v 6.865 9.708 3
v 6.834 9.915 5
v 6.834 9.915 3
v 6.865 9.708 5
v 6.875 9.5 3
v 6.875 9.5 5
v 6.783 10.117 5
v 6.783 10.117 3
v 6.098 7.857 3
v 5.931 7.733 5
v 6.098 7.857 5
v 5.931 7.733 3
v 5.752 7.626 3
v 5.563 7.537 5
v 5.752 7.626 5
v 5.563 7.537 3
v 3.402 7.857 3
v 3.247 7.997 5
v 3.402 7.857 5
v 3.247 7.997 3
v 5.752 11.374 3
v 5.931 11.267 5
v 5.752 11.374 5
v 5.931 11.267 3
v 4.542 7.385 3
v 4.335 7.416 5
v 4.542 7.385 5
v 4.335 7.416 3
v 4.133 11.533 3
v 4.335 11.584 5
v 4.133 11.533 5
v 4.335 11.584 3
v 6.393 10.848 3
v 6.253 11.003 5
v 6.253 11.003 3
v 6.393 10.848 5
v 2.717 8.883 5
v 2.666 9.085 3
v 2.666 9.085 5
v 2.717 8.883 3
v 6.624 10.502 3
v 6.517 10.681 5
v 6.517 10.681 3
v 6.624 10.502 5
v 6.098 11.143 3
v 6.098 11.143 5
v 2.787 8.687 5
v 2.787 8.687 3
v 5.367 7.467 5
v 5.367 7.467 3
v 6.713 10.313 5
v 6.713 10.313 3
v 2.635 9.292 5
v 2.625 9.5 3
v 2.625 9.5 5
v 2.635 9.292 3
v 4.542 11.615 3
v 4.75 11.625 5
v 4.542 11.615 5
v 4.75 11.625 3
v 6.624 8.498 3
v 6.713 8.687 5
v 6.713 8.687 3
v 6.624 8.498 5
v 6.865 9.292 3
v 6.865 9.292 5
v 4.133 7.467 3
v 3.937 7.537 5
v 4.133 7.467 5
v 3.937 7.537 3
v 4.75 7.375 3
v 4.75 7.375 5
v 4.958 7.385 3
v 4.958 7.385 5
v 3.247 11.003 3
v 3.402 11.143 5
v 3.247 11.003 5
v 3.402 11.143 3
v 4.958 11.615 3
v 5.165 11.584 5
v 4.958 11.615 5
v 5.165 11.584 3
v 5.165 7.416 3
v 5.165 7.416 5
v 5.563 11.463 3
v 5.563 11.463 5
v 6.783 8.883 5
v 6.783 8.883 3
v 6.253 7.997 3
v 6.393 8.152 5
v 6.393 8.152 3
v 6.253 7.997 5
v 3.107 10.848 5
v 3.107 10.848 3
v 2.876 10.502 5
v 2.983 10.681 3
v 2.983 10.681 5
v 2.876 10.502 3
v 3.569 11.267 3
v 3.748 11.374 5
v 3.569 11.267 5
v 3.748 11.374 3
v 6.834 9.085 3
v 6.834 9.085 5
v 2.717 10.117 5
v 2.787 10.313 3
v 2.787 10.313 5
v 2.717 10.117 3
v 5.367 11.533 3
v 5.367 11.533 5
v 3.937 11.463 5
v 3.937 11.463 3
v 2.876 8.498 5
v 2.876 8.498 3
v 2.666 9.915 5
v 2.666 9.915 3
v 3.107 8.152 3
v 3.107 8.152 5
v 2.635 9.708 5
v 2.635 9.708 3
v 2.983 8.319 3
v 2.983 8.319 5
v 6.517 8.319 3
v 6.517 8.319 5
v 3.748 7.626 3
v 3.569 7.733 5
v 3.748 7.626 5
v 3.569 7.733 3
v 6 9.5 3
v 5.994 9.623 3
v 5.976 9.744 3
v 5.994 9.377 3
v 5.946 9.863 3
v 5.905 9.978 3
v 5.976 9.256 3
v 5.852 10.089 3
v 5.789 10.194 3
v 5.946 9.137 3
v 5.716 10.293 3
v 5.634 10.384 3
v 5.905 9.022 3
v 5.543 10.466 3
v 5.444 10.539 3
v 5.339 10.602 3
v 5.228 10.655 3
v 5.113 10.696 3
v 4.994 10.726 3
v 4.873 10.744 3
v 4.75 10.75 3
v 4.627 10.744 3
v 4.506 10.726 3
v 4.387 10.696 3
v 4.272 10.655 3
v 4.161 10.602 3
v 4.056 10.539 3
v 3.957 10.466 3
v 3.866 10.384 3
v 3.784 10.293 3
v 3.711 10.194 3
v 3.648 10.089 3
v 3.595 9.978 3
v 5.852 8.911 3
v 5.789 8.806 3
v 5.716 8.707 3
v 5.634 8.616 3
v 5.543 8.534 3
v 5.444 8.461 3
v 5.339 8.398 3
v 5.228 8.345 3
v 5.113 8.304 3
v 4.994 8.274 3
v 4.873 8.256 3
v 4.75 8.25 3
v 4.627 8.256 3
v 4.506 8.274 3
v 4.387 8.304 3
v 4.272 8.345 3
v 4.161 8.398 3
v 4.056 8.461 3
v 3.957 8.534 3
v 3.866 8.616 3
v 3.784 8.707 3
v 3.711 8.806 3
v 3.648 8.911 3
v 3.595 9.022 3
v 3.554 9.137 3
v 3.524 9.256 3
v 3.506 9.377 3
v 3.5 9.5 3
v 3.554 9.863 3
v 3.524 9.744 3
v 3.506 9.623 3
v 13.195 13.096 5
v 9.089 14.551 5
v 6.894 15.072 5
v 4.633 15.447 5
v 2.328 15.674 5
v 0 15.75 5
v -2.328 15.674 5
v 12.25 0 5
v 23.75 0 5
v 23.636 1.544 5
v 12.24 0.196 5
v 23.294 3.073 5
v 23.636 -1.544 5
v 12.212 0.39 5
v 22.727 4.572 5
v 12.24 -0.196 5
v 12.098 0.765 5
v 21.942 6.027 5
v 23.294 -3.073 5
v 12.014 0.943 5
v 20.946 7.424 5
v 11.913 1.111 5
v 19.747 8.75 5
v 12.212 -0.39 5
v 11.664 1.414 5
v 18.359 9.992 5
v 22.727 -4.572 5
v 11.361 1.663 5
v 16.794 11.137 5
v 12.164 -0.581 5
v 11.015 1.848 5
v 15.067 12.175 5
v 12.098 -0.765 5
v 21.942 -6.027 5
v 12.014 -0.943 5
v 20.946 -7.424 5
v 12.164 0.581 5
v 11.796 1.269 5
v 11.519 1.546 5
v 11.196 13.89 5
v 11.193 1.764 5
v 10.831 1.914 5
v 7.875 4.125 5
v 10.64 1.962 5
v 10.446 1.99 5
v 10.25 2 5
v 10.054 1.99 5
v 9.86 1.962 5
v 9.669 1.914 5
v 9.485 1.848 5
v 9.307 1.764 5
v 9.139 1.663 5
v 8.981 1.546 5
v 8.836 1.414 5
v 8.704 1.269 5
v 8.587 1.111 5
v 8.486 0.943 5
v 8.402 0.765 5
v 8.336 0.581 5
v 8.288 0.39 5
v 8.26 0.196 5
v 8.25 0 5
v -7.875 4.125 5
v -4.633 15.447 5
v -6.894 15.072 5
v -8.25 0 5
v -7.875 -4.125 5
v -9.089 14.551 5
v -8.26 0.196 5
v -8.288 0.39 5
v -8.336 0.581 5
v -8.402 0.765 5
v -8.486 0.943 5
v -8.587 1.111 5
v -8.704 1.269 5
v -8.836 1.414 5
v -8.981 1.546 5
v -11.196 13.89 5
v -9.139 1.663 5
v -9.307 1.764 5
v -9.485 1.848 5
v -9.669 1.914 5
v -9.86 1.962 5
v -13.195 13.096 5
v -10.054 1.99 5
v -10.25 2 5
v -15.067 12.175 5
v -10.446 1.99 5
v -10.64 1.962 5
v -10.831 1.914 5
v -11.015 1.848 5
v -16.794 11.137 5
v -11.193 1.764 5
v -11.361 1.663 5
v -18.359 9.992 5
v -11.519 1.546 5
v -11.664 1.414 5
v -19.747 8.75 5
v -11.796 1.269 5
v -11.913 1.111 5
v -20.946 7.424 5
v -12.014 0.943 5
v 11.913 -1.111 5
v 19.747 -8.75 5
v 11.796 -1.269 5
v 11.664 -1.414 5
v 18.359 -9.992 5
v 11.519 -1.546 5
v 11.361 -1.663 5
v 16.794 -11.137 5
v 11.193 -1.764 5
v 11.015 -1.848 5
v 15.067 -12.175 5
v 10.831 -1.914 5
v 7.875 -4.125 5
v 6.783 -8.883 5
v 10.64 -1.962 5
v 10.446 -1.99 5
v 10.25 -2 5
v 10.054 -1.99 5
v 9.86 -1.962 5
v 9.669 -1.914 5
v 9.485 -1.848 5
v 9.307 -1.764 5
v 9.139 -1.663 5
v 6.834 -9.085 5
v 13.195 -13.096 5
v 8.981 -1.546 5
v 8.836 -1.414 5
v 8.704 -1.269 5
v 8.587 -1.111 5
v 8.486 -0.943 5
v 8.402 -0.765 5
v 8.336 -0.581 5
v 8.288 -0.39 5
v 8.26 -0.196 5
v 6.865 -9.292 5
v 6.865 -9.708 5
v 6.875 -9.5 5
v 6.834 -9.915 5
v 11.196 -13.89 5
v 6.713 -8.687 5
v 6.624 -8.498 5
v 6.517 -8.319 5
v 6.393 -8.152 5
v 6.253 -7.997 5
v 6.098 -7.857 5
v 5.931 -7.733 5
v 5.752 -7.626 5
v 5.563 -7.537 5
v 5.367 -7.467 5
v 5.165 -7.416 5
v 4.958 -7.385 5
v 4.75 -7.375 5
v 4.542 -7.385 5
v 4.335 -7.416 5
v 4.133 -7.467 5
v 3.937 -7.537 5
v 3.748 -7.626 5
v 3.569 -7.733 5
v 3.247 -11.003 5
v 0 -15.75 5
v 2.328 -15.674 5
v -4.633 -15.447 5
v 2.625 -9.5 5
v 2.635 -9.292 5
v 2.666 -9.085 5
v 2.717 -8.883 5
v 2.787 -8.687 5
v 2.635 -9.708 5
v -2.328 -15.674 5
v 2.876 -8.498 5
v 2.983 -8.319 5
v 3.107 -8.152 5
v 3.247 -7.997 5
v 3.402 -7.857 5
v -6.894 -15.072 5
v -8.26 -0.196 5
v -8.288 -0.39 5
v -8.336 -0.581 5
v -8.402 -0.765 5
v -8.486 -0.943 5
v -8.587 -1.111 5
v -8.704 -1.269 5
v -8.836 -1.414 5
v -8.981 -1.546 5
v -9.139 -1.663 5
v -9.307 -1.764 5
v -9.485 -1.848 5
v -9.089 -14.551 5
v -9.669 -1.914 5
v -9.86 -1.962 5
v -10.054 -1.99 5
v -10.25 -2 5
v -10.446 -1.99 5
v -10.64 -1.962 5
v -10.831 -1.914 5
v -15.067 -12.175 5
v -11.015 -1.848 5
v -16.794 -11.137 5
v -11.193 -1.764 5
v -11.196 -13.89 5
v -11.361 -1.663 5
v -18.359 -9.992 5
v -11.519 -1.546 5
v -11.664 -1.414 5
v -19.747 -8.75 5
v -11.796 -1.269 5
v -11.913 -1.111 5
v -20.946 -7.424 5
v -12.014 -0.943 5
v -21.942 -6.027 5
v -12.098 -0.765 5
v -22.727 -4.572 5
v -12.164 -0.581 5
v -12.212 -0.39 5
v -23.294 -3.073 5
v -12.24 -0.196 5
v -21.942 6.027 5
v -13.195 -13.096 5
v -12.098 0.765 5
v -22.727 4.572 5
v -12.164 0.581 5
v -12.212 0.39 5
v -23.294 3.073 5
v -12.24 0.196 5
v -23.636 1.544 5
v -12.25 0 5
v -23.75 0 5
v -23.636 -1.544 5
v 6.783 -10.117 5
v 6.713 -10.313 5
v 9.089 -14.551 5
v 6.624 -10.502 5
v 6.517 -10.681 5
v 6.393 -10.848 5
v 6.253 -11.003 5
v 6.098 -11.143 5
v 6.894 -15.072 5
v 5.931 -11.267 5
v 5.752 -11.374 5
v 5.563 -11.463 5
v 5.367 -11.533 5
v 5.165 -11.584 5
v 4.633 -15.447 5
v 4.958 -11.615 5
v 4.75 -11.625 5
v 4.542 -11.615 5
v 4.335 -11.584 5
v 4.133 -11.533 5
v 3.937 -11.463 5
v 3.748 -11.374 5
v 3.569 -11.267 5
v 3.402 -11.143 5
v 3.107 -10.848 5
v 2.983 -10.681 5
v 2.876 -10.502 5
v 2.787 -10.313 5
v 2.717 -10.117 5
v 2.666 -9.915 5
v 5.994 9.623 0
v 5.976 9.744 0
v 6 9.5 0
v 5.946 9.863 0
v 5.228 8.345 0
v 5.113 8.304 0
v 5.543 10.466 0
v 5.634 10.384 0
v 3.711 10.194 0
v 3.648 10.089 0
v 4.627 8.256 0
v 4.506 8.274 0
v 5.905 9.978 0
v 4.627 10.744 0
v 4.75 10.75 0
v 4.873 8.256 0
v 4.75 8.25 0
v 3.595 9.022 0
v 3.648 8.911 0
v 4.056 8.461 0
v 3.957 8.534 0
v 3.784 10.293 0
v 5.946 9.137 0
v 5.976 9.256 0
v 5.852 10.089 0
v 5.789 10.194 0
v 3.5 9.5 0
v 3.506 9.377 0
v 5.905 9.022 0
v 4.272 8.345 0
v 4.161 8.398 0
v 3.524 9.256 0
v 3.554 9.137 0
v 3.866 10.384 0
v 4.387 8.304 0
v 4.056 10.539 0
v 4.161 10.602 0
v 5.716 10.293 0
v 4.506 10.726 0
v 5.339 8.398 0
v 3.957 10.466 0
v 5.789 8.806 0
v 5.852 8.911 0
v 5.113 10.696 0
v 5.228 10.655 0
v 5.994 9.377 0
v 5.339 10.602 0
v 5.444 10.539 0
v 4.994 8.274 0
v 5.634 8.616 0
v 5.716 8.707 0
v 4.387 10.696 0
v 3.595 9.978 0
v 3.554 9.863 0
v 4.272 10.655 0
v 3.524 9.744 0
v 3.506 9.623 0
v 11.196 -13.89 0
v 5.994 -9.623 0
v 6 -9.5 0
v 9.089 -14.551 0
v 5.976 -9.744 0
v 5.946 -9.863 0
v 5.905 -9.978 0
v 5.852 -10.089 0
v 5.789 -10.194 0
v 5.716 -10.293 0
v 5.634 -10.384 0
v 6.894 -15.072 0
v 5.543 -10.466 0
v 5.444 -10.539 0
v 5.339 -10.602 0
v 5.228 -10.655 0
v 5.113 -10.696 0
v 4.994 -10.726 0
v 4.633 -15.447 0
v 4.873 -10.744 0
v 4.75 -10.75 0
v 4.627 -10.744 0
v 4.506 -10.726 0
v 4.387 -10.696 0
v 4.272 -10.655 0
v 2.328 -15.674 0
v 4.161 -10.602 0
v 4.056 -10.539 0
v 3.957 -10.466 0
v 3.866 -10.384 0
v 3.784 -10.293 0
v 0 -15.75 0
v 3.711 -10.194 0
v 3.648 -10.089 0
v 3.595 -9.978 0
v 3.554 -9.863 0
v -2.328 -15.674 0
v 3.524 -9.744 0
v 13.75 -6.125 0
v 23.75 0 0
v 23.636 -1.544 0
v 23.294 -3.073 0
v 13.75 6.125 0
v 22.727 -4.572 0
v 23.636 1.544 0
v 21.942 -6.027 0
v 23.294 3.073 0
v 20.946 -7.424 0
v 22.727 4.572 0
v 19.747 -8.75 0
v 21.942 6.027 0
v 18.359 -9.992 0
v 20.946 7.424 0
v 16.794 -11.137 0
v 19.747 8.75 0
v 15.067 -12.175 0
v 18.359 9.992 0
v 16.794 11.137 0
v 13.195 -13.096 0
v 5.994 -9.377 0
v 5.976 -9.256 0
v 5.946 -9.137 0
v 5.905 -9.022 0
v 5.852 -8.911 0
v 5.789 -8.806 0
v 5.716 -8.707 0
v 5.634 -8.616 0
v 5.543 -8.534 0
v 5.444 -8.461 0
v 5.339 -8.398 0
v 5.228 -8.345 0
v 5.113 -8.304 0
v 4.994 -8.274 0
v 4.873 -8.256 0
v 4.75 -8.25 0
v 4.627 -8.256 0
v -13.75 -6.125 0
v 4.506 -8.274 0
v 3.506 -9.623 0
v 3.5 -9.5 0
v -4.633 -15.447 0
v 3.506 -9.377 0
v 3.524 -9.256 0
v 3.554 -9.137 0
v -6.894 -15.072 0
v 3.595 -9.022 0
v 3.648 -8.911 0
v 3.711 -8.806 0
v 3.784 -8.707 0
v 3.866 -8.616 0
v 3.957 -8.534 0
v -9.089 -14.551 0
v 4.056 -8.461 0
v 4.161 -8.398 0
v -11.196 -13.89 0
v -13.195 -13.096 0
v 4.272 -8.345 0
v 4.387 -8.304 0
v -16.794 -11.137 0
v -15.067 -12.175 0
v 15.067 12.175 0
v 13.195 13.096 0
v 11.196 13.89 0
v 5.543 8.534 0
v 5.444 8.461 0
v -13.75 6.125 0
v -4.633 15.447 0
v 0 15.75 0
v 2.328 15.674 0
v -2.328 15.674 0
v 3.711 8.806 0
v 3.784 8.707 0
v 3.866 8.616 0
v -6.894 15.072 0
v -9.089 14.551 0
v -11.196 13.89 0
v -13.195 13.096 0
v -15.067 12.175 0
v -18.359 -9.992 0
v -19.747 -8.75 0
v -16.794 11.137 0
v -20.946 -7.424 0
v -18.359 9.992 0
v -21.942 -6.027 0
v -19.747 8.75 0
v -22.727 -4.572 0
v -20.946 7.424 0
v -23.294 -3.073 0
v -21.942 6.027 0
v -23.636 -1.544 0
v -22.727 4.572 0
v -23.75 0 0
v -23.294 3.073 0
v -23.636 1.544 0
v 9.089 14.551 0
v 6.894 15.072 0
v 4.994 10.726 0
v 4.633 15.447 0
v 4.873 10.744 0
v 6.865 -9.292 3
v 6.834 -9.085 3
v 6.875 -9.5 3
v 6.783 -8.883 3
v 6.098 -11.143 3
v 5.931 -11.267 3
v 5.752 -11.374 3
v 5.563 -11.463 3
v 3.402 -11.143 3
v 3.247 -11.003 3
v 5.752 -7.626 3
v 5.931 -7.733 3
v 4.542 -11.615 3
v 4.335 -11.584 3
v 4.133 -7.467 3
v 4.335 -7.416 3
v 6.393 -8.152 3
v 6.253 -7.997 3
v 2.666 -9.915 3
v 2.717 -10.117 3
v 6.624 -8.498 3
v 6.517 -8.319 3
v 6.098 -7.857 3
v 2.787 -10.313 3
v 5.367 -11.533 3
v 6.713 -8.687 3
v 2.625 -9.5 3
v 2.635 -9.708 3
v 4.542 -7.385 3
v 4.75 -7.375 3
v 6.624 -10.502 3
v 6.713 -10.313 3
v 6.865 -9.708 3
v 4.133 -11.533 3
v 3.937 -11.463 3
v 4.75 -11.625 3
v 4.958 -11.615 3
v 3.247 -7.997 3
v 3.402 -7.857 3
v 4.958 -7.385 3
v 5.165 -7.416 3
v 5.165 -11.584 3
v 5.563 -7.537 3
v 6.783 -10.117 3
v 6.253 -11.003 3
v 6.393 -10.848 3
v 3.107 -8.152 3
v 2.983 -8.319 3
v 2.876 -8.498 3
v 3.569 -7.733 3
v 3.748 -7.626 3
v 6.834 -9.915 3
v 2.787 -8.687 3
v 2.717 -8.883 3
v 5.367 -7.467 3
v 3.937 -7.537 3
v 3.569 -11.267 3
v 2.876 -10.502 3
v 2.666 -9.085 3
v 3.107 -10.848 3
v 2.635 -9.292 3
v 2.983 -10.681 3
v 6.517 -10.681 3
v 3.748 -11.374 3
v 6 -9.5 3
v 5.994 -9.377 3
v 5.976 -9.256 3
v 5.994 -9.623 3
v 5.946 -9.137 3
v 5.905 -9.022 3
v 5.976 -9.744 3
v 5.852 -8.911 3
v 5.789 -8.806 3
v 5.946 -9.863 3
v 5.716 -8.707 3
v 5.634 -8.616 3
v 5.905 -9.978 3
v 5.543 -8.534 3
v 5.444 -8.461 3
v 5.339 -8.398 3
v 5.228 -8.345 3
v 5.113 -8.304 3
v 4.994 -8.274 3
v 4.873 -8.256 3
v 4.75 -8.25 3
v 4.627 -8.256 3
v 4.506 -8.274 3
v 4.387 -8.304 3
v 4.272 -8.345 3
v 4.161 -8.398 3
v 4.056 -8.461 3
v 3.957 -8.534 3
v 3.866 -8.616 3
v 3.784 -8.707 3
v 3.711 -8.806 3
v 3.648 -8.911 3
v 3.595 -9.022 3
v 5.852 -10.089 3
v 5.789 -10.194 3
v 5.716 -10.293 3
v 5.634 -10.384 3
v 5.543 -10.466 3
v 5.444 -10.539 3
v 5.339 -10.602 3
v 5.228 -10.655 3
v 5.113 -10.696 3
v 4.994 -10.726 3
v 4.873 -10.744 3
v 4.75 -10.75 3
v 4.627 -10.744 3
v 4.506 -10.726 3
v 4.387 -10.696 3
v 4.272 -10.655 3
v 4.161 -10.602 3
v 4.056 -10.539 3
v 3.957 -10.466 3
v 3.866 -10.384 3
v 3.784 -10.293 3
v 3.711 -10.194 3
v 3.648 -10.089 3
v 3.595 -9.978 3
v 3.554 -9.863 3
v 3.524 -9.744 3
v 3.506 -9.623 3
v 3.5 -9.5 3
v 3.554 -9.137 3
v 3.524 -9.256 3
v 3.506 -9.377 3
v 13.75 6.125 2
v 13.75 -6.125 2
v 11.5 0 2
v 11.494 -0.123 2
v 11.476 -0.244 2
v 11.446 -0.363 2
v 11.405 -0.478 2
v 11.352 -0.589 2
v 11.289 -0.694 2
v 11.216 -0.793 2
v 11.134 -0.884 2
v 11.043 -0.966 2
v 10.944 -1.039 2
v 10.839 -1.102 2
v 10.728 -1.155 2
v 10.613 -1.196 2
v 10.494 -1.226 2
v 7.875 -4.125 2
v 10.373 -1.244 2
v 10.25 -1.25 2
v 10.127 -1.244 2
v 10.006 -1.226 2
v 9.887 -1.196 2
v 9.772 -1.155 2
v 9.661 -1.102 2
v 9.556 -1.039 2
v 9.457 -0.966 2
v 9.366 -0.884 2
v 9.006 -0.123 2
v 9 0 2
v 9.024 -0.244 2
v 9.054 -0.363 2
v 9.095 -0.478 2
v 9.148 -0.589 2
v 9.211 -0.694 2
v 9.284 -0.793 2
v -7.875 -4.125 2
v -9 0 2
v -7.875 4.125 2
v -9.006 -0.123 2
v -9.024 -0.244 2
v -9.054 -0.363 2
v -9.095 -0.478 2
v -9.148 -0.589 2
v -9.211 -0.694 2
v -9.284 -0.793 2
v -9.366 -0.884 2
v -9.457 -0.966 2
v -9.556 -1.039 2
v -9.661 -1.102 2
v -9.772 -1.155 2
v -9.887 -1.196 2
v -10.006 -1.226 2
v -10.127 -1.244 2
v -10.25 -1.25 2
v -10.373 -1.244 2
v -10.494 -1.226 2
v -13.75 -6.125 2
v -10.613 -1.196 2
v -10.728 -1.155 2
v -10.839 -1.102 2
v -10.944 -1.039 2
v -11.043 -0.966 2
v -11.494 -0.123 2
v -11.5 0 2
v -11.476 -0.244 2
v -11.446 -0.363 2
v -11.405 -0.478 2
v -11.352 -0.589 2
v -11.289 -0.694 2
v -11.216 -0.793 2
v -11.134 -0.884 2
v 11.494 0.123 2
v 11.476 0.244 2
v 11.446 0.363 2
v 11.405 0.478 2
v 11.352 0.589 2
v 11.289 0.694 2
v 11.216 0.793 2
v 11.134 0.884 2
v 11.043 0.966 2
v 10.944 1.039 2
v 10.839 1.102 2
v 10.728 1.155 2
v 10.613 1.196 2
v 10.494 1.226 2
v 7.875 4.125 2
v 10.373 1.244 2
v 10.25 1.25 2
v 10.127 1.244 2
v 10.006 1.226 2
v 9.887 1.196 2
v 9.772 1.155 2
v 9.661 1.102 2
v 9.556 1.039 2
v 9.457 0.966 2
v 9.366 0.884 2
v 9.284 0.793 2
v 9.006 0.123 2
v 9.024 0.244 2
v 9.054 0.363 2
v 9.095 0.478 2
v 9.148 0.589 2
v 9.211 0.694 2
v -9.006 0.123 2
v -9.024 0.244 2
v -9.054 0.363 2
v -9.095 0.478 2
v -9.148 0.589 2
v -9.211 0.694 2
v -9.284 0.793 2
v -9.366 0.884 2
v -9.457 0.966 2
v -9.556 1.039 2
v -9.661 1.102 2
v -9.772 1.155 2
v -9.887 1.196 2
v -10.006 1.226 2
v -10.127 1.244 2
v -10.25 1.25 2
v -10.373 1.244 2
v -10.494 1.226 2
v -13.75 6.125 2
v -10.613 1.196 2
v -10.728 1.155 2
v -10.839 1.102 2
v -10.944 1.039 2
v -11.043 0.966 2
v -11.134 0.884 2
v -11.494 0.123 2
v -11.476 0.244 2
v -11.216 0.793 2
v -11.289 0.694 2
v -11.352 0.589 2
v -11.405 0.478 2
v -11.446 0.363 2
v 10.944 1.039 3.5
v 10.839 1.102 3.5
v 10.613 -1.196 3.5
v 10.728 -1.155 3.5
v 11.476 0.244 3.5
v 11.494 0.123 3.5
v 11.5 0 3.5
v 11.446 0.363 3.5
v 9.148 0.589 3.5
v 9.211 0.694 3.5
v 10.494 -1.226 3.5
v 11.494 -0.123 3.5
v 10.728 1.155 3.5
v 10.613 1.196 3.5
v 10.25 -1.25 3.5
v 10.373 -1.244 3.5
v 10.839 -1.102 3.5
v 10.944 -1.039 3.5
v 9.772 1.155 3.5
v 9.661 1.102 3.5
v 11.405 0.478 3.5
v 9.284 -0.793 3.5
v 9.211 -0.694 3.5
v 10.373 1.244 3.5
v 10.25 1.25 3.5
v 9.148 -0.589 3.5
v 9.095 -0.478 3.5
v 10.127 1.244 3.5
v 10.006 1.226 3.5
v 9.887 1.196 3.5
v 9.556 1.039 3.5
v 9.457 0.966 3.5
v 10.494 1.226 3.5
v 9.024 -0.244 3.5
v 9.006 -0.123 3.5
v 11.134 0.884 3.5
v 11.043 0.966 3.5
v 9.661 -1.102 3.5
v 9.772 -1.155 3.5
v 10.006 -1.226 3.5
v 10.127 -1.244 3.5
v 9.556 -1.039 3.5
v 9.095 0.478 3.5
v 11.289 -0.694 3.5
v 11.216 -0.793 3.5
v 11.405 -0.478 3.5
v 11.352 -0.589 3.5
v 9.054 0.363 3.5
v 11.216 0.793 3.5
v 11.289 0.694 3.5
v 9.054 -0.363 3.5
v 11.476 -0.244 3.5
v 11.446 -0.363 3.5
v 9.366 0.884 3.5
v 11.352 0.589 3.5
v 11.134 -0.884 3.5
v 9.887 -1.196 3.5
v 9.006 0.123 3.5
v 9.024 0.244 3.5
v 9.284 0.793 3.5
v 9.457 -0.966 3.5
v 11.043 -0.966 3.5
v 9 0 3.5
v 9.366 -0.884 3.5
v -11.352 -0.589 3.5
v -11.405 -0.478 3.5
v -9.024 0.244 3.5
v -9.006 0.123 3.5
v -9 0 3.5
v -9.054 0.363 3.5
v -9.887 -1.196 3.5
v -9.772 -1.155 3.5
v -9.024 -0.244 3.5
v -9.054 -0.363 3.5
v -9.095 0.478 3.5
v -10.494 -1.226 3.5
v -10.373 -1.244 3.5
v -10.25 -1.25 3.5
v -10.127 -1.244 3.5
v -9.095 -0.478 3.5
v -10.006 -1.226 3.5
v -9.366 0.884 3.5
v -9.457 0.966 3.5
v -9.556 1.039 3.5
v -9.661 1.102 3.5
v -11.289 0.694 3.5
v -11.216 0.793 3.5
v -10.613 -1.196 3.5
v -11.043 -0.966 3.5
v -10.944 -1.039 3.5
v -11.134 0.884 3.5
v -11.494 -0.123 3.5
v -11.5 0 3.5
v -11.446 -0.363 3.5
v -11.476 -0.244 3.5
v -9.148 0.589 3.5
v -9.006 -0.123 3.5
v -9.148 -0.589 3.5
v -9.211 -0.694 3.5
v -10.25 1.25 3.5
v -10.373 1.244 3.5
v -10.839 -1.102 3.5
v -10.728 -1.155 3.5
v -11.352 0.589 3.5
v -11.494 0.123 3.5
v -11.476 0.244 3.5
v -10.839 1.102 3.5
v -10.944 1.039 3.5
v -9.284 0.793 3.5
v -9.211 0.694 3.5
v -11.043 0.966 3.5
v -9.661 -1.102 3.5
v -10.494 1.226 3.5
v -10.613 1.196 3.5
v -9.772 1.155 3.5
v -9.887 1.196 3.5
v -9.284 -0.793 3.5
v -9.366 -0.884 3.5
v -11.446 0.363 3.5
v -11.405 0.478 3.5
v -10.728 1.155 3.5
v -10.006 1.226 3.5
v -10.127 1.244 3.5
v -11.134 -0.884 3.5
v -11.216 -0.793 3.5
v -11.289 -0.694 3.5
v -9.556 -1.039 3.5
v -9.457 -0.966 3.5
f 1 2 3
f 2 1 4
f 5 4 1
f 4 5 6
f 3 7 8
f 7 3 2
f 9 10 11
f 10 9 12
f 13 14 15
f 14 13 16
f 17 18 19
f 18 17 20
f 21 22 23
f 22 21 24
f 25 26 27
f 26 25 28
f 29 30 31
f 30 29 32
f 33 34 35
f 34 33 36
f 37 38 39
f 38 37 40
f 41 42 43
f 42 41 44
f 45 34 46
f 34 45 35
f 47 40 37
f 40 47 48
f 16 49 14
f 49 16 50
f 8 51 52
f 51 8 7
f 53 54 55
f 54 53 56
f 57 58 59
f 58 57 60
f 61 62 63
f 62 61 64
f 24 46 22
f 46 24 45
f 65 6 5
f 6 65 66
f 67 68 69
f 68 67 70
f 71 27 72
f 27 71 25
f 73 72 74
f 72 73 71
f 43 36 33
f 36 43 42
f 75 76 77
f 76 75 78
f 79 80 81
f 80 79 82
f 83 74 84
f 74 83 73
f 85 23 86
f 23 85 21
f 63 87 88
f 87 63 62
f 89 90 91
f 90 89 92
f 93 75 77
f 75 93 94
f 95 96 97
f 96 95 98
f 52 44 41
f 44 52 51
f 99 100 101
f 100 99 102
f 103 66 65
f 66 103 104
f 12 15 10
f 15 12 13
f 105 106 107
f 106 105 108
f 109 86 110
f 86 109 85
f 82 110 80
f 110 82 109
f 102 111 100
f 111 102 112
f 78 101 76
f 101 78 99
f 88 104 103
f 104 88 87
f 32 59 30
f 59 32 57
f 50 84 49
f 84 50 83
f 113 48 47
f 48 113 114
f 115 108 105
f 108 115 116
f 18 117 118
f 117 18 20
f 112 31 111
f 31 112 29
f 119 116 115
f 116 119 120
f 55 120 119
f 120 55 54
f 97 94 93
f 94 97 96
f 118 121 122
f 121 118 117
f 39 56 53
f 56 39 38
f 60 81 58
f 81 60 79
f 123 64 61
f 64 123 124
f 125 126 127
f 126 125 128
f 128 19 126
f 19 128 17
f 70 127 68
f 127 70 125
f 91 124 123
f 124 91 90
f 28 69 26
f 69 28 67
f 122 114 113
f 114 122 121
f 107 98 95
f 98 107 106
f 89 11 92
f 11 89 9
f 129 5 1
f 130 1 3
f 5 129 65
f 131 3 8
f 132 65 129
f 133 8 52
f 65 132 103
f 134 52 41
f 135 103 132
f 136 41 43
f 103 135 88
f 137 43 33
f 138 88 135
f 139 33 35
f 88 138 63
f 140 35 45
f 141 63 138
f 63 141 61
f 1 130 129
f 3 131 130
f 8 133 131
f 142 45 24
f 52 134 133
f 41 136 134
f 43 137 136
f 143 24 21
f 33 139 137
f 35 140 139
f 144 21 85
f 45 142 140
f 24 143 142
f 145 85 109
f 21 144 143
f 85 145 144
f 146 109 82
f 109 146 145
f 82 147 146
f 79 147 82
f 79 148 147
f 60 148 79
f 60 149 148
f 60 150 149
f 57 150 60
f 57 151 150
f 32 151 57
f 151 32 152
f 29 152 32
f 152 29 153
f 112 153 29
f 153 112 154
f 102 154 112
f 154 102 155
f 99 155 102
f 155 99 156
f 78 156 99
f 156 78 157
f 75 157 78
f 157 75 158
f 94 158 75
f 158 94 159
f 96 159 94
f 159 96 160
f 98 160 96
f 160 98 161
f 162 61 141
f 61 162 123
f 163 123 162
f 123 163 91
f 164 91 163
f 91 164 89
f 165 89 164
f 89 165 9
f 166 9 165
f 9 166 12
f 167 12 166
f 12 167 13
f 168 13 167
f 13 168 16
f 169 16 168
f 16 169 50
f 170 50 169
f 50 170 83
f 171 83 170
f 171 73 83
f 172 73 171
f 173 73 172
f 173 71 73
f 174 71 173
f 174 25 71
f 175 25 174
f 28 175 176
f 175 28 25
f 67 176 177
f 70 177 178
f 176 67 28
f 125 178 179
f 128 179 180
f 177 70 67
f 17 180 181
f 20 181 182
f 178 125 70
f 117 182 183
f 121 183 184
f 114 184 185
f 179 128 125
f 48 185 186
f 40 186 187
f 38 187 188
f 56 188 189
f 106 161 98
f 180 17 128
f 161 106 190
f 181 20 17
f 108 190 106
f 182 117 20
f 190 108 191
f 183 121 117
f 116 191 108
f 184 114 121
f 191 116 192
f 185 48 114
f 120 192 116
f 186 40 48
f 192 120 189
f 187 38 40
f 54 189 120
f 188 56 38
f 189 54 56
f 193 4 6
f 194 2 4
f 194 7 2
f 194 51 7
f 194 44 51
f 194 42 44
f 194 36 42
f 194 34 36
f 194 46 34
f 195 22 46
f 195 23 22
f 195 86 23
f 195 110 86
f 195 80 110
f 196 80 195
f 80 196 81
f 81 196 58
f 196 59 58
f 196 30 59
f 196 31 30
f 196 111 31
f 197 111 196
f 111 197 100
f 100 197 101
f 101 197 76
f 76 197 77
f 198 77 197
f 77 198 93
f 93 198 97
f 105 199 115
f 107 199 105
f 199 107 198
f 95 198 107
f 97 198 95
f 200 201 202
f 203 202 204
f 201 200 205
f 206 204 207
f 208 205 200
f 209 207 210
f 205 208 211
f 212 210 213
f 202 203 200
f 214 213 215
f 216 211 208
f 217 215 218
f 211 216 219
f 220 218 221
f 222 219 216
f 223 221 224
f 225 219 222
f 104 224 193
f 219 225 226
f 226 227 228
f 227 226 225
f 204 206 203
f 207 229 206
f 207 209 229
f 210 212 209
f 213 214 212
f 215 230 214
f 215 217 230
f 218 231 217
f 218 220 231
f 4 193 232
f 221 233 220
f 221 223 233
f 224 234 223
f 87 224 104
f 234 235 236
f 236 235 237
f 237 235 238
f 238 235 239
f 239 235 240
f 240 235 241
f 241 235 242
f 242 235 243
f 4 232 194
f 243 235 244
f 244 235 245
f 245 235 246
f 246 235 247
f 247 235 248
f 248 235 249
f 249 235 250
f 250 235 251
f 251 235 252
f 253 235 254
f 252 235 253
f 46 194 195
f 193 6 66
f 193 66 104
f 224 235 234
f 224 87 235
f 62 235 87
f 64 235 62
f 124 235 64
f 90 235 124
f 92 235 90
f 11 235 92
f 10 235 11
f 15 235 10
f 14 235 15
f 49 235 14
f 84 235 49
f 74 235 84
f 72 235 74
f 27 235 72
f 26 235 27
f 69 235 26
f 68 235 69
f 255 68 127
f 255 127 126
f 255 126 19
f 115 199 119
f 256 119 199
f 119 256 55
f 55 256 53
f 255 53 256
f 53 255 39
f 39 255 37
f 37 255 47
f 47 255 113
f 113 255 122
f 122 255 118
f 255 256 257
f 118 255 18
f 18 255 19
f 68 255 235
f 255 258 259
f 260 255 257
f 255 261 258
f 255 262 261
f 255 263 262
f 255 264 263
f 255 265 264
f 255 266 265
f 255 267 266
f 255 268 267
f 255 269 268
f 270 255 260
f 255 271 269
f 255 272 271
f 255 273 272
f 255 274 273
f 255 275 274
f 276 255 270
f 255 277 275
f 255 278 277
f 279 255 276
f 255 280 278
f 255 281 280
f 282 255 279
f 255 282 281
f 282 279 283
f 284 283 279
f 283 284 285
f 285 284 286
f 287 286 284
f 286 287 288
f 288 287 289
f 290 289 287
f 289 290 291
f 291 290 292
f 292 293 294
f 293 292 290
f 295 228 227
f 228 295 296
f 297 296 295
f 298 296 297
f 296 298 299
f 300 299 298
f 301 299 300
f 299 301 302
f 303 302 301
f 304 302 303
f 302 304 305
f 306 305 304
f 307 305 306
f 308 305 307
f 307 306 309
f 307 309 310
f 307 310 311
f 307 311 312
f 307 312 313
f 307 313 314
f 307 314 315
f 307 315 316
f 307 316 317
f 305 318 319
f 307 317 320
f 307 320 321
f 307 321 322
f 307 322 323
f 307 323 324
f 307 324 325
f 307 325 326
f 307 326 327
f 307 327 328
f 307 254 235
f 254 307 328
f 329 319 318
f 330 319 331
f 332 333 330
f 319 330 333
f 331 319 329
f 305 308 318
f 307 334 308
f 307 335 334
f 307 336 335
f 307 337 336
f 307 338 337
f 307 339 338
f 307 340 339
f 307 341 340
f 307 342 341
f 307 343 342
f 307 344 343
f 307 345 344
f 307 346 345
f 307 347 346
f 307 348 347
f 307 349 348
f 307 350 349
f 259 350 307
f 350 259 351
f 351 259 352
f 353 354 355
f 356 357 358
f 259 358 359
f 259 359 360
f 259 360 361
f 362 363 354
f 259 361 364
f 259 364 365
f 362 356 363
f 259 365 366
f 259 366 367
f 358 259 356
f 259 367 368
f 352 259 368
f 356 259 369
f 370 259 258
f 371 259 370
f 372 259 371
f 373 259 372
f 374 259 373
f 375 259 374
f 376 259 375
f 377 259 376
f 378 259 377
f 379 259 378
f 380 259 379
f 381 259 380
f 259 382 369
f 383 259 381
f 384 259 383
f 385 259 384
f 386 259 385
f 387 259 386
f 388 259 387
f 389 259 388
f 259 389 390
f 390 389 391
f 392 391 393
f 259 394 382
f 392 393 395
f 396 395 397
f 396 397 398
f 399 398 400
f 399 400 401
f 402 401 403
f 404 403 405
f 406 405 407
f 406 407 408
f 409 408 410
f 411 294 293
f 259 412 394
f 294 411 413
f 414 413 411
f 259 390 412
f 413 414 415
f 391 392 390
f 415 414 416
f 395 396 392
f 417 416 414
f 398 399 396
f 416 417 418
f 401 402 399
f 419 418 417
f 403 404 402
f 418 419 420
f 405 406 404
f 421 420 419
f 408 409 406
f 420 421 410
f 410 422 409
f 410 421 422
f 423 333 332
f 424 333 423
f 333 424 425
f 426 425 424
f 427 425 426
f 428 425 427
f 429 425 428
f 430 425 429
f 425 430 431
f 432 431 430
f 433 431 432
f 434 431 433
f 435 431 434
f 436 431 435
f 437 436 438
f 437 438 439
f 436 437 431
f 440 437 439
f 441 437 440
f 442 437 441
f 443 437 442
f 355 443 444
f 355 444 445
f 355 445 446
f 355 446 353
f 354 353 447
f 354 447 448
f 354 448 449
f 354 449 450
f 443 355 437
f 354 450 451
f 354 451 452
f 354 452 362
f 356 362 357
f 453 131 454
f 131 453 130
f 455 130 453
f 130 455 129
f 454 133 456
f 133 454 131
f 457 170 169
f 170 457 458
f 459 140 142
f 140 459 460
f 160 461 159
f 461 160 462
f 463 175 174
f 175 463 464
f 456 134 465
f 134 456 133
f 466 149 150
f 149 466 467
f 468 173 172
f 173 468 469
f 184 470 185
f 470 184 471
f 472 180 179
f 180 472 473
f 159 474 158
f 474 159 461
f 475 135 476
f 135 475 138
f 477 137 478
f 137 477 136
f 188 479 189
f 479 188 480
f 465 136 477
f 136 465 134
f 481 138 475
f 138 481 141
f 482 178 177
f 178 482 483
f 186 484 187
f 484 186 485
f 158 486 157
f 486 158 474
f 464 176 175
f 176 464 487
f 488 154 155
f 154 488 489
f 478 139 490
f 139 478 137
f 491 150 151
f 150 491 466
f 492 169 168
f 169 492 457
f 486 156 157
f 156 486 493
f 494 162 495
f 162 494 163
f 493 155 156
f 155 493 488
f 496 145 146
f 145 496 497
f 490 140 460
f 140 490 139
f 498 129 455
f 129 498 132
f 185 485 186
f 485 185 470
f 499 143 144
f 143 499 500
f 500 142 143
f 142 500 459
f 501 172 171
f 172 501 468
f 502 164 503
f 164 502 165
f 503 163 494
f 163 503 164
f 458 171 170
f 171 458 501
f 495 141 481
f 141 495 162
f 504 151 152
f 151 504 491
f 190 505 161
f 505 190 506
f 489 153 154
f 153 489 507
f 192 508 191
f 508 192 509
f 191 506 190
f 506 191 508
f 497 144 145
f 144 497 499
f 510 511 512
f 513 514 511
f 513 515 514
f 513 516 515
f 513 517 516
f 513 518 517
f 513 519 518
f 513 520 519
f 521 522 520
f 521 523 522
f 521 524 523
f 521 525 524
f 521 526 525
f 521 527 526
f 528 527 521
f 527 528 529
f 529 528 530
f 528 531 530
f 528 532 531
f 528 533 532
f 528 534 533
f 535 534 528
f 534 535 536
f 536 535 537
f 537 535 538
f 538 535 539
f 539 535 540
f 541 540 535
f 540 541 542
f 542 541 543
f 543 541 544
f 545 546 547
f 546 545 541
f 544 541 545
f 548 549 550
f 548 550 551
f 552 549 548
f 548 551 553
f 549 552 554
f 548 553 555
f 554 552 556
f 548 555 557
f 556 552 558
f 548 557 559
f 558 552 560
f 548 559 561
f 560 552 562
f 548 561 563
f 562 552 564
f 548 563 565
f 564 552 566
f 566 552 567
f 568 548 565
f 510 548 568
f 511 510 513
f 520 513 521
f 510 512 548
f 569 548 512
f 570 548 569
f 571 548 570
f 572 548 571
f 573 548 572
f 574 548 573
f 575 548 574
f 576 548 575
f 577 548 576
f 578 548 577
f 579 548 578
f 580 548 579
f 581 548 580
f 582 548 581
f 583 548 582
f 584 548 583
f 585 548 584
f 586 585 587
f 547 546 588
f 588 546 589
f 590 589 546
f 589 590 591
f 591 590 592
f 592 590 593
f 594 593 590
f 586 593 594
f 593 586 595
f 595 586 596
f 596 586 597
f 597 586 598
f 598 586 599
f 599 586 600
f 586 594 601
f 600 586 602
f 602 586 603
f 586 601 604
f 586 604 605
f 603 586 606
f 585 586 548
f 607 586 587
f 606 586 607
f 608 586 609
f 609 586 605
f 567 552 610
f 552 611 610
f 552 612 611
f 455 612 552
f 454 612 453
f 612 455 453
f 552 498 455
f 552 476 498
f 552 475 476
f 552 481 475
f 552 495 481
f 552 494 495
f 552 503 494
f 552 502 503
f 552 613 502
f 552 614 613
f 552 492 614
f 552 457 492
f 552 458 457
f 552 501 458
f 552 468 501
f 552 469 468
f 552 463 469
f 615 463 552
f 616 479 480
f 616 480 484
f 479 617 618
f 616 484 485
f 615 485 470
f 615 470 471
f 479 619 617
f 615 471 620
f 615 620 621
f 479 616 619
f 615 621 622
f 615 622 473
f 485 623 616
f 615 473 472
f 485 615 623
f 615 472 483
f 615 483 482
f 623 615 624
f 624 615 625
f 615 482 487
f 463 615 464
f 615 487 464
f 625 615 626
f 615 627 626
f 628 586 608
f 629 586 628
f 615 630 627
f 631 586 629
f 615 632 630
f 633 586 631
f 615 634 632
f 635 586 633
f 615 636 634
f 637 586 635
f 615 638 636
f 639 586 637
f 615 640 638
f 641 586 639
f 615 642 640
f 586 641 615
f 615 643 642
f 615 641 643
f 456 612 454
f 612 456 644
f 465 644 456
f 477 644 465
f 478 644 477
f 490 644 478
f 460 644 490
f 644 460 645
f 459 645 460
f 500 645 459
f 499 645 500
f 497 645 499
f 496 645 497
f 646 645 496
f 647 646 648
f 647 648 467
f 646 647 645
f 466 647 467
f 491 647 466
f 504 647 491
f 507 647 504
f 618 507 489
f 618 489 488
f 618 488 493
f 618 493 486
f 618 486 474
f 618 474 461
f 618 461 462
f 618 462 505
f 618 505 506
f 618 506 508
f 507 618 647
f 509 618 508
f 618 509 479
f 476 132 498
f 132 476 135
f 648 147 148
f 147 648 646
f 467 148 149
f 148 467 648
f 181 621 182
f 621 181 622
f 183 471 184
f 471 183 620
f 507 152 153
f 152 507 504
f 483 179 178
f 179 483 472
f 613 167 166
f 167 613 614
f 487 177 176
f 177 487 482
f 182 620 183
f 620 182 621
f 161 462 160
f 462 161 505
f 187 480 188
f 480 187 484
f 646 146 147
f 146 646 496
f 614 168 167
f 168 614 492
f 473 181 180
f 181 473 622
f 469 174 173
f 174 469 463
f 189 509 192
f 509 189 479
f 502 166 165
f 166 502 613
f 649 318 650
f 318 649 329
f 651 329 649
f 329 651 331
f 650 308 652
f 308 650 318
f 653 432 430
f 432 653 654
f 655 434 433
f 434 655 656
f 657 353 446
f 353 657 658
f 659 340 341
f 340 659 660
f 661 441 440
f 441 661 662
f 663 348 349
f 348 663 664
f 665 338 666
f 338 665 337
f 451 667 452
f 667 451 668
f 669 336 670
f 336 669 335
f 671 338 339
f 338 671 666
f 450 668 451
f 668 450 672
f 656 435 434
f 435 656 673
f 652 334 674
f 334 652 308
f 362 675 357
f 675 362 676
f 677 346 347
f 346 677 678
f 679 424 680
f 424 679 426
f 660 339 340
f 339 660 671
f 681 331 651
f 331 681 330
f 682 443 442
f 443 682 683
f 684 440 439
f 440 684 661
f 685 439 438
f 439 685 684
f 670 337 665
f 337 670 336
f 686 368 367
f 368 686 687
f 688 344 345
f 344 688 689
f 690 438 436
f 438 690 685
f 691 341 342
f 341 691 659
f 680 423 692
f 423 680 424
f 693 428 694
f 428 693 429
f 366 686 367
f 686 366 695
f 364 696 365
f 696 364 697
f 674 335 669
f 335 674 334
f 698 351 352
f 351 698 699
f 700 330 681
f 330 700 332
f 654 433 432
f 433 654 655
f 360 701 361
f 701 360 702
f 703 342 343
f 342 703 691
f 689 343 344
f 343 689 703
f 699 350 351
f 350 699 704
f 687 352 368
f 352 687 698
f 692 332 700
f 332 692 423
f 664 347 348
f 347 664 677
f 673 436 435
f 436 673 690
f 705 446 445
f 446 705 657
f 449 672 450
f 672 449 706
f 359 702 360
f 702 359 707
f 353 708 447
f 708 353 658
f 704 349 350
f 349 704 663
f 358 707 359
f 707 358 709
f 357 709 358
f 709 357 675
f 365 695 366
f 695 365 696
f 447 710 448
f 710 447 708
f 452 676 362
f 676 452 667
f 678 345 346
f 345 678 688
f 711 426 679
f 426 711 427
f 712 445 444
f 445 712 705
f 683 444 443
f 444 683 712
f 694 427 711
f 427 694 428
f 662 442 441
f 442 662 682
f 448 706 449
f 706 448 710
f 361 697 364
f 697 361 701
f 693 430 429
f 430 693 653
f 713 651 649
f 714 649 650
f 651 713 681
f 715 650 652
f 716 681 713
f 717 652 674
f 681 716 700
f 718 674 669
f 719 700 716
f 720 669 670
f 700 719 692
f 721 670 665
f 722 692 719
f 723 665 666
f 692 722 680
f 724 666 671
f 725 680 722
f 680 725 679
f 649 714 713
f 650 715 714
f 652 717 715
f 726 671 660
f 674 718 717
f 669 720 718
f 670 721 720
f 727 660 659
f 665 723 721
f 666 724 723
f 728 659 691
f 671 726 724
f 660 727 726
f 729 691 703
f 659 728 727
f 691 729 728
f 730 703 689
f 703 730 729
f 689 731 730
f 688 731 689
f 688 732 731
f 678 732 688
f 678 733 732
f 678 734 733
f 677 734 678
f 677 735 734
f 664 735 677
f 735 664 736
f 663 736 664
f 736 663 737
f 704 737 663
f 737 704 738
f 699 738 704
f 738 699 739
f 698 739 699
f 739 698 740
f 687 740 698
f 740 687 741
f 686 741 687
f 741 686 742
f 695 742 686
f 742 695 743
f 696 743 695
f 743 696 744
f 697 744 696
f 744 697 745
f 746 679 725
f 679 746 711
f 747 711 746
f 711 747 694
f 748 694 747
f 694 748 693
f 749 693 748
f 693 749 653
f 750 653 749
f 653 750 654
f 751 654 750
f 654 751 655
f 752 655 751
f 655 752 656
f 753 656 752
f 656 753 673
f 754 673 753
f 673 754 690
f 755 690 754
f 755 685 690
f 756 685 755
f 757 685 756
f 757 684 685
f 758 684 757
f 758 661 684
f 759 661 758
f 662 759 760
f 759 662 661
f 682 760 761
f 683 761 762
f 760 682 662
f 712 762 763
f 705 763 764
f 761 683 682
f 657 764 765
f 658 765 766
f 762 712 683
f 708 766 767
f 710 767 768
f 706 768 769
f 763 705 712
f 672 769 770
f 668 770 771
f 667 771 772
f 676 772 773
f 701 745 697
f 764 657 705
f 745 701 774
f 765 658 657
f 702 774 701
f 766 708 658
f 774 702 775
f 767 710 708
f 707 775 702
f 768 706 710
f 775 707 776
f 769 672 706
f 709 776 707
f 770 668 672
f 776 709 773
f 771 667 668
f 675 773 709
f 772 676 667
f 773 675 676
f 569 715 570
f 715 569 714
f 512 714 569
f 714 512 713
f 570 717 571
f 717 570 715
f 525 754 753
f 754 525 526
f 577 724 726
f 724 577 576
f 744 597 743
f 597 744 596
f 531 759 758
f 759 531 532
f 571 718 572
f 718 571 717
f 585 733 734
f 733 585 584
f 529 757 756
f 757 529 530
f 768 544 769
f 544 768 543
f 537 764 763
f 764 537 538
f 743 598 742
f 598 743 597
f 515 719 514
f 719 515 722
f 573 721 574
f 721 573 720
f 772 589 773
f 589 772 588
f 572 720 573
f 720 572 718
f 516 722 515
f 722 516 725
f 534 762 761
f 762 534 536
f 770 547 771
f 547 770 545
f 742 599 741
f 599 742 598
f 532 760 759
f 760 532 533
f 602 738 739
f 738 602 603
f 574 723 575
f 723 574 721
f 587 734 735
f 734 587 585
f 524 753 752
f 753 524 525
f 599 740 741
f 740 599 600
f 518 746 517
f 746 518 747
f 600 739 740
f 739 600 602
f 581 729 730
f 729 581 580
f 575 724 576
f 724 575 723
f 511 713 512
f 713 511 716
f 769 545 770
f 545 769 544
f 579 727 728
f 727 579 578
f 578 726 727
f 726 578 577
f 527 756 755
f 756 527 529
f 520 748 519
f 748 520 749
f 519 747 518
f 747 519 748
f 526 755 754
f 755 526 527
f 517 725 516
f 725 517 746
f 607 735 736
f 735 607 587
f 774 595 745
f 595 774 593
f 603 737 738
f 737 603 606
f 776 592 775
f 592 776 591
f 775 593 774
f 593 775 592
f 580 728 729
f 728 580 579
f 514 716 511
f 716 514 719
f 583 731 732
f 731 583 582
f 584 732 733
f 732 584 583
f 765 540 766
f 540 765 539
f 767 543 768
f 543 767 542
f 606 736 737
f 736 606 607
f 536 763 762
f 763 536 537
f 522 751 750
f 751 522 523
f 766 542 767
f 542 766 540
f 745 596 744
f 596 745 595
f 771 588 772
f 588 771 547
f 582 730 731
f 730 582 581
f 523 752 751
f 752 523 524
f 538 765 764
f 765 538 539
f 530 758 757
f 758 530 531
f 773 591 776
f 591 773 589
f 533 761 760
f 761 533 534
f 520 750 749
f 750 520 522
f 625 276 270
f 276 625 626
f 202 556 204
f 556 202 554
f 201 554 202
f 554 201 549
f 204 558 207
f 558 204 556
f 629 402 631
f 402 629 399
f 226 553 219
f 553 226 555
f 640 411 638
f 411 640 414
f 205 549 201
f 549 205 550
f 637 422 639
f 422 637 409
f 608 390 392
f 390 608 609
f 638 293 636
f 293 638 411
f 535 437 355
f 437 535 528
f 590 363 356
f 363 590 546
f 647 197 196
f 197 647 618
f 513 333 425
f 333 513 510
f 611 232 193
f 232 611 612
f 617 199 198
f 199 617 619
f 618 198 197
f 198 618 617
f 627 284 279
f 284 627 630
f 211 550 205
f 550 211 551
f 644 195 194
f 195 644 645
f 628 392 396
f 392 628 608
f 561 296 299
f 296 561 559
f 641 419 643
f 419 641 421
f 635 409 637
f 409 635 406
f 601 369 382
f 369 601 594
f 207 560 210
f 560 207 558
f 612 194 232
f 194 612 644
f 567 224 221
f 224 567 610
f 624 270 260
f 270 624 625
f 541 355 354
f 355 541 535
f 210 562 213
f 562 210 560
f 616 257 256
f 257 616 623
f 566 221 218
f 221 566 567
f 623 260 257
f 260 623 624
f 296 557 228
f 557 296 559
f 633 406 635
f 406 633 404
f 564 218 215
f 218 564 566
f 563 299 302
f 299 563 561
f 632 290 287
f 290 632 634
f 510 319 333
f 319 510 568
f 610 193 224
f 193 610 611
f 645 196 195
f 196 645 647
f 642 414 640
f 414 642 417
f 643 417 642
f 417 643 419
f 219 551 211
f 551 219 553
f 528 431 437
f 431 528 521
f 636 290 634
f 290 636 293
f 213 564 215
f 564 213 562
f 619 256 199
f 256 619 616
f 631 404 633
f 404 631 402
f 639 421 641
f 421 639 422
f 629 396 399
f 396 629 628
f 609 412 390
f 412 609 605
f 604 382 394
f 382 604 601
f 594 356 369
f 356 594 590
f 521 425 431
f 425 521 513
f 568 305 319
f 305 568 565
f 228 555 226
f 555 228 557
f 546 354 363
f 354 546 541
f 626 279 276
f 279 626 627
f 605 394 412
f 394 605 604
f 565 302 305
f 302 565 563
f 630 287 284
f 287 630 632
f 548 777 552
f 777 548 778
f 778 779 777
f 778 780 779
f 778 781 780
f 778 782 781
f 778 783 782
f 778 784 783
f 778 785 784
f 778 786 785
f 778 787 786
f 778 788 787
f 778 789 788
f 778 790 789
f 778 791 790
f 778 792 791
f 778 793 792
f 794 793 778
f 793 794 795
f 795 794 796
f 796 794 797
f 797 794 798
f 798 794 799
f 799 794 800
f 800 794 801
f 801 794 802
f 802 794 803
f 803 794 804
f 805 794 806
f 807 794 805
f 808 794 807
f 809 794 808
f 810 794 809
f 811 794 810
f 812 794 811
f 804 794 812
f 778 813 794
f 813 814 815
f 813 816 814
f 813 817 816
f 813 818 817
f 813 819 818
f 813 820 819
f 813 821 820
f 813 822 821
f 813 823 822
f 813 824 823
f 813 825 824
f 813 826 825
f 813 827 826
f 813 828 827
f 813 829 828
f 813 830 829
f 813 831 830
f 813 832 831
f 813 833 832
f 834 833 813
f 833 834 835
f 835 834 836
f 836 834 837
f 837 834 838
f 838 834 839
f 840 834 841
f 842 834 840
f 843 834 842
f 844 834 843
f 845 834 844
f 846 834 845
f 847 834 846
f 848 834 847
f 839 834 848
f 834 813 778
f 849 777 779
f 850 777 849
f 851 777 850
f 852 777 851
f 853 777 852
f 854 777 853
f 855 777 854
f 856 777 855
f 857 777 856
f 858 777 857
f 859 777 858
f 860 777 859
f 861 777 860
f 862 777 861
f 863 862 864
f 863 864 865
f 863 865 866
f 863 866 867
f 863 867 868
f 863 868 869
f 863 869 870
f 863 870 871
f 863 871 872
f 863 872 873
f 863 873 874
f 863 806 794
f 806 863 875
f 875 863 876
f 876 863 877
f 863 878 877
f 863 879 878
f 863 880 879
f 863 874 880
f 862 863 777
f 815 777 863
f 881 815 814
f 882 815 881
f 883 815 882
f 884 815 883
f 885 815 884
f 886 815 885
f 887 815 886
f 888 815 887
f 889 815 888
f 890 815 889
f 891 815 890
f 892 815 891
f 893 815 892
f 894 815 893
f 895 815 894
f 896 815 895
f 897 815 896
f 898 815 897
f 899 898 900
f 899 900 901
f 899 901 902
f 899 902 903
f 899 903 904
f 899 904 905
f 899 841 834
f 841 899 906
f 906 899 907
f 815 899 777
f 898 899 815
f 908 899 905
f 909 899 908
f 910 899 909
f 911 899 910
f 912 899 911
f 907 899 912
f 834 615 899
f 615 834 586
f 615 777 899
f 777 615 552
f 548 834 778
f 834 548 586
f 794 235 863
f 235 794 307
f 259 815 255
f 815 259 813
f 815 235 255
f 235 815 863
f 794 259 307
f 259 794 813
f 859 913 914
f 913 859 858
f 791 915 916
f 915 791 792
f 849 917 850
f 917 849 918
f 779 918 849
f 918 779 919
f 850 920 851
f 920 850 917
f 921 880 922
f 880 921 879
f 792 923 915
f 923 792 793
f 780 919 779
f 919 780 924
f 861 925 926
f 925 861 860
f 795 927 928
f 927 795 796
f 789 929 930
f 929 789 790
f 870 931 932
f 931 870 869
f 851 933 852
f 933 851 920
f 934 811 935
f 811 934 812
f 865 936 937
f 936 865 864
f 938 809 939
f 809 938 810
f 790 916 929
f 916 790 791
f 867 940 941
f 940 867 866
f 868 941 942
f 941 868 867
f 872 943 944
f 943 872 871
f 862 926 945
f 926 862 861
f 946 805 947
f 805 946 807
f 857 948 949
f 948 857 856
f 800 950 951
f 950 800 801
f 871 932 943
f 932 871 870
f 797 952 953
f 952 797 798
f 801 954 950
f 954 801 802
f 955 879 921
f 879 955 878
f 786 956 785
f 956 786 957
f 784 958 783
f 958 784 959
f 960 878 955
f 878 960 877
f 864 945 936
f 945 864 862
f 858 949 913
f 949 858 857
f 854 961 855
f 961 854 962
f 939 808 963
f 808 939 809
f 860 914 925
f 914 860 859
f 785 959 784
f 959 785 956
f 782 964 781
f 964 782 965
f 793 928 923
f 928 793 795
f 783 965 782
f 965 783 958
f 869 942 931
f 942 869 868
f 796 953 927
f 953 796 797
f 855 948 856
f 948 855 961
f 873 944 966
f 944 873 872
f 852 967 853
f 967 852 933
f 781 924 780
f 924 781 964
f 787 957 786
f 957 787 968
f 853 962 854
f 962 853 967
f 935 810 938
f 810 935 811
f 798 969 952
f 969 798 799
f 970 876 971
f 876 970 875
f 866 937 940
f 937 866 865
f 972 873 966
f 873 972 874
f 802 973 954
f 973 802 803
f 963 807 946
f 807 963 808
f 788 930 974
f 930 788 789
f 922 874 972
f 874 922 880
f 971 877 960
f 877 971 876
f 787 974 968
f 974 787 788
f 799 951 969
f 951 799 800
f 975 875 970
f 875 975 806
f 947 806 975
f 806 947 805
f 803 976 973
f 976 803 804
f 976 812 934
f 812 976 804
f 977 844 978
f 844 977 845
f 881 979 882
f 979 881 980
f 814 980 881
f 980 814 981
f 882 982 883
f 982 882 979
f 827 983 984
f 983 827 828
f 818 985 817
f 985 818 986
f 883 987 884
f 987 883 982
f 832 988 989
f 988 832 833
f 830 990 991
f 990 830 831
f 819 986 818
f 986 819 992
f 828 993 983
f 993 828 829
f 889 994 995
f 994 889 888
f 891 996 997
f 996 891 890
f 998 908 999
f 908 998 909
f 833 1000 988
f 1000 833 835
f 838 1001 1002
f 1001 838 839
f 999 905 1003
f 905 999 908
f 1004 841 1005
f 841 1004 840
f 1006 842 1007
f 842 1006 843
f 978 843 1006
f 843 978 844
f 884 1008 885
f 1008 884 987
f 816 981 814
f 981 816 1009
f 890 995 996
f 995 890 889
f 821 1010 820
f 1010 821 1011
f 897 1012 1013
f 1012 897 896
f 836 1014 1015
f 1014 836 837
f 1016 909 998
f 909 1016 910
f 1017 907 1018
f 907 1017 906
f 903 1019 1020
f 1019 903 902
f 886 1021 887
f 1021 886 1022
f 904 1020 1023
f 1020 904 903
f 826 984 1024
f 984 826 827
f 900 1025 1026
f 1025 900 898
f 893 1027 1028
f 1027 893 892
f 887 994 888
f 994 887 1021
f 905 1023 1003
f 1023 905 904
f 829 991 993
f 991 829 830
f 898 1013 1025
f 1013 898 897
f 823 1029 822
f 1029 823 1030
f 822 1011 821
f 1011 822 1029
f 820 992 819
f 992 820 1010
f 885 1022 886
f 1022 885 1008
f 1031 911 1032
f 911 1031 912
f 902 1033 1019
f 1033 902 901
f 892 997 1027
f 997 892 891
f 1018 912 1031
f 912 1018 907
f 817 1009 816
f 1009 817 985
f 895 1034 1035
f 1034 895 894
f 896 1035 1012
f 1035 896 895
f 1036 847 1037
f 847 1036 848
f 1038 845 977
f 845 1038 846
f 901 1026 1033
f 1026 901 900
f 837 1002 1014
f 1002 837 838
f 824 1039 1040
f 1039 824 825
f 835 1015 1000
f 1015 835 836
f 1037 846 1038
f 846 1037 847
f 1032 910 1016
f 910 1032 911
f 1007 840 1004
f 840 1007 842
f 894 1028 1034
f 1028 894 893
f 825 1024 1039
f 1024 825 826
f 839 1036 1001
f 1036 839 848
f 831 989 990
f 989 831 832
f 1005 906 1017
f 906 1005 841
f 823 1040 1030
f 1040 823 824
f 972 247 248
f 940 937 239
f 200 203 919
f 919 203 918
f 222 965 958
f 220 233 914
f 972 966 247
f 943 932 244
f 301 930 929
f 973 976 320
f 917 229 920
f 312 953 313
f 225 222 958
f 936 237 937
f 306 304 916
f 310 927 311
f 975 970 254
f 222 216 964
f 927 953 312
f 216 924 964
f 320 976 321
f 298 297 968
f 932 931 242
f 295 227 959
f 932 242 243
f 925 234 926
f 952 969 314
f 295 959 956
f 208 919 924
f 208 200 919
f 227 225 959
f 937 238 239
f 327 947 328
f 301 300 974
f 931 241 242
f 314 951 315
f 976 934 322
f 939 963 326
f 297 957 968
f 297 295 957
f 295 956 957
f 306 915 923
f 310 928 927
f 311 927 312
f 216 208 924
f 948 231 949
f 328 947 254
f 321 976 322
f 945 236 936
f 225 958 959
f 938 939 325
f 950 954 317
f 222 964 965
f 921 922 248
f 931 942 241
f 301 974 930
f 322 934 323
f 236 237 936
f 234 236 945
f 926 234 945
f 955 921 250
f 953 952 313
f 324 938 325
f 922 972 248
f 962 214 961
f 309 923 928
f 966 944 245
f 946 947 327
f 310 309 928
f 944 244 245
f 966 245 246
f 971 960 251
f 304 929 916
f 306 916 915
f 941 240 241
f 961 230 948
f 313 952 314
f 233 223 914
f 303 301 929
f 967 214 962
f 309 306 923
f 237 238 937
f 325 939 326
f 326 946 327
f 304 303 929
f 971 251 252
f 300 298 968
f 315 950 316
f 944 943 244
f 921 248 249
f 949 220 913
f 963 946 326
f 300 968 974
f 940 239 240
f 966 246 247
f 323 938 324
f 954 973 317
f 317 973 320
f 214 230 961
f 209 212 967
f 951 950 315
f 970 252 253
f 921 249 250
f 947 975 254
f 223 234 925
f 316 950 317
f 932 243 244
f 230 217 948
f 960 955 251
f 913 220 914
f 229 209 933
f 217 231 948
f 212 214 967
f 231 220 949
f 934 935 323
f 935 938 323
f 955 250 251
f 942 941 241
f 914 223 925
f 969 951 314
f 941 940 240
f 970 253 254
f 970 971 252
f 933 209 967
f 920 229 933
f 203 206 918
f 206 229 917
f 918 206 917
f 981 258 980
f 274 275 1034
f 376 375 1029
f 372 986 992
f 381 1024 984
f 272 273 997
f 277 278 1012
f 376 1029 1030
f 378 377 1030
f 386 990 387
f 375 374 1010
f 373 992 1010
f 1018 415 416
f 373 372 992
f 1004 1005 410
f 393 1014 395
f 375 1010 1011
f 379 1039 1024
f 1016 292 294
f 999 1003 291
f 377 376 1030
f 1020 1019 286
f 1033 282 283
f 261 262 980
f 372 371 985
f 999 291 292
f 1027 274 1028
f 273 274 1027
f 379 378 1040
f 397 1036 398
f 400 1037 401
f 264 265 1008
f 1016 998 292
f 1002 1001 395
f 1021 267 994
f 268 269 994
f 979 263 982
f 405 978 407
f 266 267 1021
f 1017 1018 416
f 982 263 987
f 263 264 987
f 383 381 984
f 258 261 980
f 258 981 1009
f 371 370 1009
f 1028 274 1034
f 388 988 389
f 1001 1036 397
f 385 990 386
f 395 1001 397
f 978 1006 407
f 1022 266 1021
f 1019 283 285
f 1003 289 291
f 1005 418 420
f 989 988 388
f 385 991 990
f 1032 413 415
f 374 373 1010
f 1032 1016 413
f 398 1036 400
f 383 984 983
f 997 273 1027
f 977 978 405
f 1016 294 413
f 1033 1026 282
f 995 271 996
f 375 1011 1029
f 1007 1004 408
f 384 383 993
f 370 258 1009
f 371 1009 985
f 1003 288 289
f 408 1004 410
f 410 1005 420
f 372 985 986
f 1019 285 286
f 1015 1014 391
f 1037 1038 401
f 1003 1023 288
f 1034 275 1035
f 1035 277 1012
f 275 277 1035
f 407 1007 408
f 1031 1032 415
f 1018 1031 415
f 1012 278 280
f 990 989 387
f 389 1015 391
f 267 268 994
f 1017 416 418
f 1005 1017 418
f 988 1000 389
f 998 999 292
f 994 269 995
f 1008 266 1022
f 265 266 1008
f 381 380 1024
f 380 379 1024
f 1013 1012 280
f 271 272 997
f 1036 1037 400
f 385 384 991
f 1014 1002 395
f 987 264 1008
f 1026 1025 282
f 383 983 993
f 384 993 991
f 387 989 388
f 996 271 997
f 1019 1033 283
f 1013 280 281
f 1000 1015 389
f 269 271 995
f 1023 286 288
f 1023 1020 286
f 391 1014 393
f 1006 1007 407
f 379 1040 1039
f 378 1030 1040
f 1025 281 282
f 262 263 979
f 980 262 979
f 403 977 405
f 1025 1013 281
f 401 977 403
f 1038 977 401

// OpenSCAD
// replacement bottom cover for 4mm banana plug sockets (Pollin 451956) for some Philips Lumea IPL device
$fn=64;
sock_bot = [11, 3];
sock_top = [8.5, 8];
screw = [4.25, 2.5, 2]; // head dia, thread dia, head height
screw_dx = 28.5; // offset
screw_dy = 19;   // distance
oval = [47.5, 31.5, 37]; // z: usable space in x
bottom = 5;
wall = 2;

module bananaplug(){
    difference(){
        base();

        translate([-(sock_bot.x/2 + wall), 0, 0]){
            cylinder(d=sock_top.x, h=bottom);
            translate([0, 0, bottom-sock_bot.y]) cylinder(d=sock_bot.x, h=sock_bot.y);
        }
        translate([+(sock_bot.x/2 + wall), 0, 0]){
            cylinder(d=sock_top.x, h=bottom);
            translate([0, 0, bottom-sock_bot.y]) cylinder(d=sock_bot.x, h=sock_bot.y);
        }
    }
}

module xt60_conn(){
    xt_screw = [6, 2.5, 4, 1.5];
    xt_outer = [27.5, 12.25, 4];
    xt_inner = [15.75, 8.25, 3];
    xt_holedx = 20.5;

    translate([0, 0, bottom-xt_inner.z]) union(){
        translate([-xt_outer.x/2, -xt_outer.y/2, -xt_outer.z]) cube(xt_outer);
        translate([-xt_inner.x/2, -xt_inner.y/2, 0]) cube(xt_inner);
        translate([xt_holedx/2, 0, -xt_inner.z]) cylinder(d=xt_screw.y, h=xt_screw.x);
        translate([-xt_holedx/2, 0, -xt_inner.z]) cylinder(d=xt_screw.y, h=xt_screw.x);
        translate([xt_holedx/2, 0, xt_inner.z-xt_screw[3]]) cylinder(d1=xt_screw.y, d2=xt_screw.z, h=xt_screw[3]);
        translate([-xt_holedx/2, 0, xt_inner.z-xt_screw[3]]) cylinder(d1=xt_screw.y, d2=xt_screw.z, h=xt_screw[3]);
    }
}

module xt60(){
    difference(){
        base();
        xt60_conn();
    }
}

module base(){
    difference(){
        resize([oval.x, oval.y]) cylinder(d=oval.x, h=bottom);

        translate([screw_dx-oval.x/2, screw_dy/2, 0]) {
            translate([0, 0, bottom - screw.z]) cylinder(d=screw.x, h=screw.z);
            cylinder(d=screw.y, h=bottom);
        }
        translate([screw_dx-oval.x/2, -screw_dy/2, 0]) {
            translate([0, 0, bottom - screw.z]) cylinder(d=screw.x, h=screw.z);
            cylinder(d=screw.y, h=bottom);
        }
    }
}

xt60();
